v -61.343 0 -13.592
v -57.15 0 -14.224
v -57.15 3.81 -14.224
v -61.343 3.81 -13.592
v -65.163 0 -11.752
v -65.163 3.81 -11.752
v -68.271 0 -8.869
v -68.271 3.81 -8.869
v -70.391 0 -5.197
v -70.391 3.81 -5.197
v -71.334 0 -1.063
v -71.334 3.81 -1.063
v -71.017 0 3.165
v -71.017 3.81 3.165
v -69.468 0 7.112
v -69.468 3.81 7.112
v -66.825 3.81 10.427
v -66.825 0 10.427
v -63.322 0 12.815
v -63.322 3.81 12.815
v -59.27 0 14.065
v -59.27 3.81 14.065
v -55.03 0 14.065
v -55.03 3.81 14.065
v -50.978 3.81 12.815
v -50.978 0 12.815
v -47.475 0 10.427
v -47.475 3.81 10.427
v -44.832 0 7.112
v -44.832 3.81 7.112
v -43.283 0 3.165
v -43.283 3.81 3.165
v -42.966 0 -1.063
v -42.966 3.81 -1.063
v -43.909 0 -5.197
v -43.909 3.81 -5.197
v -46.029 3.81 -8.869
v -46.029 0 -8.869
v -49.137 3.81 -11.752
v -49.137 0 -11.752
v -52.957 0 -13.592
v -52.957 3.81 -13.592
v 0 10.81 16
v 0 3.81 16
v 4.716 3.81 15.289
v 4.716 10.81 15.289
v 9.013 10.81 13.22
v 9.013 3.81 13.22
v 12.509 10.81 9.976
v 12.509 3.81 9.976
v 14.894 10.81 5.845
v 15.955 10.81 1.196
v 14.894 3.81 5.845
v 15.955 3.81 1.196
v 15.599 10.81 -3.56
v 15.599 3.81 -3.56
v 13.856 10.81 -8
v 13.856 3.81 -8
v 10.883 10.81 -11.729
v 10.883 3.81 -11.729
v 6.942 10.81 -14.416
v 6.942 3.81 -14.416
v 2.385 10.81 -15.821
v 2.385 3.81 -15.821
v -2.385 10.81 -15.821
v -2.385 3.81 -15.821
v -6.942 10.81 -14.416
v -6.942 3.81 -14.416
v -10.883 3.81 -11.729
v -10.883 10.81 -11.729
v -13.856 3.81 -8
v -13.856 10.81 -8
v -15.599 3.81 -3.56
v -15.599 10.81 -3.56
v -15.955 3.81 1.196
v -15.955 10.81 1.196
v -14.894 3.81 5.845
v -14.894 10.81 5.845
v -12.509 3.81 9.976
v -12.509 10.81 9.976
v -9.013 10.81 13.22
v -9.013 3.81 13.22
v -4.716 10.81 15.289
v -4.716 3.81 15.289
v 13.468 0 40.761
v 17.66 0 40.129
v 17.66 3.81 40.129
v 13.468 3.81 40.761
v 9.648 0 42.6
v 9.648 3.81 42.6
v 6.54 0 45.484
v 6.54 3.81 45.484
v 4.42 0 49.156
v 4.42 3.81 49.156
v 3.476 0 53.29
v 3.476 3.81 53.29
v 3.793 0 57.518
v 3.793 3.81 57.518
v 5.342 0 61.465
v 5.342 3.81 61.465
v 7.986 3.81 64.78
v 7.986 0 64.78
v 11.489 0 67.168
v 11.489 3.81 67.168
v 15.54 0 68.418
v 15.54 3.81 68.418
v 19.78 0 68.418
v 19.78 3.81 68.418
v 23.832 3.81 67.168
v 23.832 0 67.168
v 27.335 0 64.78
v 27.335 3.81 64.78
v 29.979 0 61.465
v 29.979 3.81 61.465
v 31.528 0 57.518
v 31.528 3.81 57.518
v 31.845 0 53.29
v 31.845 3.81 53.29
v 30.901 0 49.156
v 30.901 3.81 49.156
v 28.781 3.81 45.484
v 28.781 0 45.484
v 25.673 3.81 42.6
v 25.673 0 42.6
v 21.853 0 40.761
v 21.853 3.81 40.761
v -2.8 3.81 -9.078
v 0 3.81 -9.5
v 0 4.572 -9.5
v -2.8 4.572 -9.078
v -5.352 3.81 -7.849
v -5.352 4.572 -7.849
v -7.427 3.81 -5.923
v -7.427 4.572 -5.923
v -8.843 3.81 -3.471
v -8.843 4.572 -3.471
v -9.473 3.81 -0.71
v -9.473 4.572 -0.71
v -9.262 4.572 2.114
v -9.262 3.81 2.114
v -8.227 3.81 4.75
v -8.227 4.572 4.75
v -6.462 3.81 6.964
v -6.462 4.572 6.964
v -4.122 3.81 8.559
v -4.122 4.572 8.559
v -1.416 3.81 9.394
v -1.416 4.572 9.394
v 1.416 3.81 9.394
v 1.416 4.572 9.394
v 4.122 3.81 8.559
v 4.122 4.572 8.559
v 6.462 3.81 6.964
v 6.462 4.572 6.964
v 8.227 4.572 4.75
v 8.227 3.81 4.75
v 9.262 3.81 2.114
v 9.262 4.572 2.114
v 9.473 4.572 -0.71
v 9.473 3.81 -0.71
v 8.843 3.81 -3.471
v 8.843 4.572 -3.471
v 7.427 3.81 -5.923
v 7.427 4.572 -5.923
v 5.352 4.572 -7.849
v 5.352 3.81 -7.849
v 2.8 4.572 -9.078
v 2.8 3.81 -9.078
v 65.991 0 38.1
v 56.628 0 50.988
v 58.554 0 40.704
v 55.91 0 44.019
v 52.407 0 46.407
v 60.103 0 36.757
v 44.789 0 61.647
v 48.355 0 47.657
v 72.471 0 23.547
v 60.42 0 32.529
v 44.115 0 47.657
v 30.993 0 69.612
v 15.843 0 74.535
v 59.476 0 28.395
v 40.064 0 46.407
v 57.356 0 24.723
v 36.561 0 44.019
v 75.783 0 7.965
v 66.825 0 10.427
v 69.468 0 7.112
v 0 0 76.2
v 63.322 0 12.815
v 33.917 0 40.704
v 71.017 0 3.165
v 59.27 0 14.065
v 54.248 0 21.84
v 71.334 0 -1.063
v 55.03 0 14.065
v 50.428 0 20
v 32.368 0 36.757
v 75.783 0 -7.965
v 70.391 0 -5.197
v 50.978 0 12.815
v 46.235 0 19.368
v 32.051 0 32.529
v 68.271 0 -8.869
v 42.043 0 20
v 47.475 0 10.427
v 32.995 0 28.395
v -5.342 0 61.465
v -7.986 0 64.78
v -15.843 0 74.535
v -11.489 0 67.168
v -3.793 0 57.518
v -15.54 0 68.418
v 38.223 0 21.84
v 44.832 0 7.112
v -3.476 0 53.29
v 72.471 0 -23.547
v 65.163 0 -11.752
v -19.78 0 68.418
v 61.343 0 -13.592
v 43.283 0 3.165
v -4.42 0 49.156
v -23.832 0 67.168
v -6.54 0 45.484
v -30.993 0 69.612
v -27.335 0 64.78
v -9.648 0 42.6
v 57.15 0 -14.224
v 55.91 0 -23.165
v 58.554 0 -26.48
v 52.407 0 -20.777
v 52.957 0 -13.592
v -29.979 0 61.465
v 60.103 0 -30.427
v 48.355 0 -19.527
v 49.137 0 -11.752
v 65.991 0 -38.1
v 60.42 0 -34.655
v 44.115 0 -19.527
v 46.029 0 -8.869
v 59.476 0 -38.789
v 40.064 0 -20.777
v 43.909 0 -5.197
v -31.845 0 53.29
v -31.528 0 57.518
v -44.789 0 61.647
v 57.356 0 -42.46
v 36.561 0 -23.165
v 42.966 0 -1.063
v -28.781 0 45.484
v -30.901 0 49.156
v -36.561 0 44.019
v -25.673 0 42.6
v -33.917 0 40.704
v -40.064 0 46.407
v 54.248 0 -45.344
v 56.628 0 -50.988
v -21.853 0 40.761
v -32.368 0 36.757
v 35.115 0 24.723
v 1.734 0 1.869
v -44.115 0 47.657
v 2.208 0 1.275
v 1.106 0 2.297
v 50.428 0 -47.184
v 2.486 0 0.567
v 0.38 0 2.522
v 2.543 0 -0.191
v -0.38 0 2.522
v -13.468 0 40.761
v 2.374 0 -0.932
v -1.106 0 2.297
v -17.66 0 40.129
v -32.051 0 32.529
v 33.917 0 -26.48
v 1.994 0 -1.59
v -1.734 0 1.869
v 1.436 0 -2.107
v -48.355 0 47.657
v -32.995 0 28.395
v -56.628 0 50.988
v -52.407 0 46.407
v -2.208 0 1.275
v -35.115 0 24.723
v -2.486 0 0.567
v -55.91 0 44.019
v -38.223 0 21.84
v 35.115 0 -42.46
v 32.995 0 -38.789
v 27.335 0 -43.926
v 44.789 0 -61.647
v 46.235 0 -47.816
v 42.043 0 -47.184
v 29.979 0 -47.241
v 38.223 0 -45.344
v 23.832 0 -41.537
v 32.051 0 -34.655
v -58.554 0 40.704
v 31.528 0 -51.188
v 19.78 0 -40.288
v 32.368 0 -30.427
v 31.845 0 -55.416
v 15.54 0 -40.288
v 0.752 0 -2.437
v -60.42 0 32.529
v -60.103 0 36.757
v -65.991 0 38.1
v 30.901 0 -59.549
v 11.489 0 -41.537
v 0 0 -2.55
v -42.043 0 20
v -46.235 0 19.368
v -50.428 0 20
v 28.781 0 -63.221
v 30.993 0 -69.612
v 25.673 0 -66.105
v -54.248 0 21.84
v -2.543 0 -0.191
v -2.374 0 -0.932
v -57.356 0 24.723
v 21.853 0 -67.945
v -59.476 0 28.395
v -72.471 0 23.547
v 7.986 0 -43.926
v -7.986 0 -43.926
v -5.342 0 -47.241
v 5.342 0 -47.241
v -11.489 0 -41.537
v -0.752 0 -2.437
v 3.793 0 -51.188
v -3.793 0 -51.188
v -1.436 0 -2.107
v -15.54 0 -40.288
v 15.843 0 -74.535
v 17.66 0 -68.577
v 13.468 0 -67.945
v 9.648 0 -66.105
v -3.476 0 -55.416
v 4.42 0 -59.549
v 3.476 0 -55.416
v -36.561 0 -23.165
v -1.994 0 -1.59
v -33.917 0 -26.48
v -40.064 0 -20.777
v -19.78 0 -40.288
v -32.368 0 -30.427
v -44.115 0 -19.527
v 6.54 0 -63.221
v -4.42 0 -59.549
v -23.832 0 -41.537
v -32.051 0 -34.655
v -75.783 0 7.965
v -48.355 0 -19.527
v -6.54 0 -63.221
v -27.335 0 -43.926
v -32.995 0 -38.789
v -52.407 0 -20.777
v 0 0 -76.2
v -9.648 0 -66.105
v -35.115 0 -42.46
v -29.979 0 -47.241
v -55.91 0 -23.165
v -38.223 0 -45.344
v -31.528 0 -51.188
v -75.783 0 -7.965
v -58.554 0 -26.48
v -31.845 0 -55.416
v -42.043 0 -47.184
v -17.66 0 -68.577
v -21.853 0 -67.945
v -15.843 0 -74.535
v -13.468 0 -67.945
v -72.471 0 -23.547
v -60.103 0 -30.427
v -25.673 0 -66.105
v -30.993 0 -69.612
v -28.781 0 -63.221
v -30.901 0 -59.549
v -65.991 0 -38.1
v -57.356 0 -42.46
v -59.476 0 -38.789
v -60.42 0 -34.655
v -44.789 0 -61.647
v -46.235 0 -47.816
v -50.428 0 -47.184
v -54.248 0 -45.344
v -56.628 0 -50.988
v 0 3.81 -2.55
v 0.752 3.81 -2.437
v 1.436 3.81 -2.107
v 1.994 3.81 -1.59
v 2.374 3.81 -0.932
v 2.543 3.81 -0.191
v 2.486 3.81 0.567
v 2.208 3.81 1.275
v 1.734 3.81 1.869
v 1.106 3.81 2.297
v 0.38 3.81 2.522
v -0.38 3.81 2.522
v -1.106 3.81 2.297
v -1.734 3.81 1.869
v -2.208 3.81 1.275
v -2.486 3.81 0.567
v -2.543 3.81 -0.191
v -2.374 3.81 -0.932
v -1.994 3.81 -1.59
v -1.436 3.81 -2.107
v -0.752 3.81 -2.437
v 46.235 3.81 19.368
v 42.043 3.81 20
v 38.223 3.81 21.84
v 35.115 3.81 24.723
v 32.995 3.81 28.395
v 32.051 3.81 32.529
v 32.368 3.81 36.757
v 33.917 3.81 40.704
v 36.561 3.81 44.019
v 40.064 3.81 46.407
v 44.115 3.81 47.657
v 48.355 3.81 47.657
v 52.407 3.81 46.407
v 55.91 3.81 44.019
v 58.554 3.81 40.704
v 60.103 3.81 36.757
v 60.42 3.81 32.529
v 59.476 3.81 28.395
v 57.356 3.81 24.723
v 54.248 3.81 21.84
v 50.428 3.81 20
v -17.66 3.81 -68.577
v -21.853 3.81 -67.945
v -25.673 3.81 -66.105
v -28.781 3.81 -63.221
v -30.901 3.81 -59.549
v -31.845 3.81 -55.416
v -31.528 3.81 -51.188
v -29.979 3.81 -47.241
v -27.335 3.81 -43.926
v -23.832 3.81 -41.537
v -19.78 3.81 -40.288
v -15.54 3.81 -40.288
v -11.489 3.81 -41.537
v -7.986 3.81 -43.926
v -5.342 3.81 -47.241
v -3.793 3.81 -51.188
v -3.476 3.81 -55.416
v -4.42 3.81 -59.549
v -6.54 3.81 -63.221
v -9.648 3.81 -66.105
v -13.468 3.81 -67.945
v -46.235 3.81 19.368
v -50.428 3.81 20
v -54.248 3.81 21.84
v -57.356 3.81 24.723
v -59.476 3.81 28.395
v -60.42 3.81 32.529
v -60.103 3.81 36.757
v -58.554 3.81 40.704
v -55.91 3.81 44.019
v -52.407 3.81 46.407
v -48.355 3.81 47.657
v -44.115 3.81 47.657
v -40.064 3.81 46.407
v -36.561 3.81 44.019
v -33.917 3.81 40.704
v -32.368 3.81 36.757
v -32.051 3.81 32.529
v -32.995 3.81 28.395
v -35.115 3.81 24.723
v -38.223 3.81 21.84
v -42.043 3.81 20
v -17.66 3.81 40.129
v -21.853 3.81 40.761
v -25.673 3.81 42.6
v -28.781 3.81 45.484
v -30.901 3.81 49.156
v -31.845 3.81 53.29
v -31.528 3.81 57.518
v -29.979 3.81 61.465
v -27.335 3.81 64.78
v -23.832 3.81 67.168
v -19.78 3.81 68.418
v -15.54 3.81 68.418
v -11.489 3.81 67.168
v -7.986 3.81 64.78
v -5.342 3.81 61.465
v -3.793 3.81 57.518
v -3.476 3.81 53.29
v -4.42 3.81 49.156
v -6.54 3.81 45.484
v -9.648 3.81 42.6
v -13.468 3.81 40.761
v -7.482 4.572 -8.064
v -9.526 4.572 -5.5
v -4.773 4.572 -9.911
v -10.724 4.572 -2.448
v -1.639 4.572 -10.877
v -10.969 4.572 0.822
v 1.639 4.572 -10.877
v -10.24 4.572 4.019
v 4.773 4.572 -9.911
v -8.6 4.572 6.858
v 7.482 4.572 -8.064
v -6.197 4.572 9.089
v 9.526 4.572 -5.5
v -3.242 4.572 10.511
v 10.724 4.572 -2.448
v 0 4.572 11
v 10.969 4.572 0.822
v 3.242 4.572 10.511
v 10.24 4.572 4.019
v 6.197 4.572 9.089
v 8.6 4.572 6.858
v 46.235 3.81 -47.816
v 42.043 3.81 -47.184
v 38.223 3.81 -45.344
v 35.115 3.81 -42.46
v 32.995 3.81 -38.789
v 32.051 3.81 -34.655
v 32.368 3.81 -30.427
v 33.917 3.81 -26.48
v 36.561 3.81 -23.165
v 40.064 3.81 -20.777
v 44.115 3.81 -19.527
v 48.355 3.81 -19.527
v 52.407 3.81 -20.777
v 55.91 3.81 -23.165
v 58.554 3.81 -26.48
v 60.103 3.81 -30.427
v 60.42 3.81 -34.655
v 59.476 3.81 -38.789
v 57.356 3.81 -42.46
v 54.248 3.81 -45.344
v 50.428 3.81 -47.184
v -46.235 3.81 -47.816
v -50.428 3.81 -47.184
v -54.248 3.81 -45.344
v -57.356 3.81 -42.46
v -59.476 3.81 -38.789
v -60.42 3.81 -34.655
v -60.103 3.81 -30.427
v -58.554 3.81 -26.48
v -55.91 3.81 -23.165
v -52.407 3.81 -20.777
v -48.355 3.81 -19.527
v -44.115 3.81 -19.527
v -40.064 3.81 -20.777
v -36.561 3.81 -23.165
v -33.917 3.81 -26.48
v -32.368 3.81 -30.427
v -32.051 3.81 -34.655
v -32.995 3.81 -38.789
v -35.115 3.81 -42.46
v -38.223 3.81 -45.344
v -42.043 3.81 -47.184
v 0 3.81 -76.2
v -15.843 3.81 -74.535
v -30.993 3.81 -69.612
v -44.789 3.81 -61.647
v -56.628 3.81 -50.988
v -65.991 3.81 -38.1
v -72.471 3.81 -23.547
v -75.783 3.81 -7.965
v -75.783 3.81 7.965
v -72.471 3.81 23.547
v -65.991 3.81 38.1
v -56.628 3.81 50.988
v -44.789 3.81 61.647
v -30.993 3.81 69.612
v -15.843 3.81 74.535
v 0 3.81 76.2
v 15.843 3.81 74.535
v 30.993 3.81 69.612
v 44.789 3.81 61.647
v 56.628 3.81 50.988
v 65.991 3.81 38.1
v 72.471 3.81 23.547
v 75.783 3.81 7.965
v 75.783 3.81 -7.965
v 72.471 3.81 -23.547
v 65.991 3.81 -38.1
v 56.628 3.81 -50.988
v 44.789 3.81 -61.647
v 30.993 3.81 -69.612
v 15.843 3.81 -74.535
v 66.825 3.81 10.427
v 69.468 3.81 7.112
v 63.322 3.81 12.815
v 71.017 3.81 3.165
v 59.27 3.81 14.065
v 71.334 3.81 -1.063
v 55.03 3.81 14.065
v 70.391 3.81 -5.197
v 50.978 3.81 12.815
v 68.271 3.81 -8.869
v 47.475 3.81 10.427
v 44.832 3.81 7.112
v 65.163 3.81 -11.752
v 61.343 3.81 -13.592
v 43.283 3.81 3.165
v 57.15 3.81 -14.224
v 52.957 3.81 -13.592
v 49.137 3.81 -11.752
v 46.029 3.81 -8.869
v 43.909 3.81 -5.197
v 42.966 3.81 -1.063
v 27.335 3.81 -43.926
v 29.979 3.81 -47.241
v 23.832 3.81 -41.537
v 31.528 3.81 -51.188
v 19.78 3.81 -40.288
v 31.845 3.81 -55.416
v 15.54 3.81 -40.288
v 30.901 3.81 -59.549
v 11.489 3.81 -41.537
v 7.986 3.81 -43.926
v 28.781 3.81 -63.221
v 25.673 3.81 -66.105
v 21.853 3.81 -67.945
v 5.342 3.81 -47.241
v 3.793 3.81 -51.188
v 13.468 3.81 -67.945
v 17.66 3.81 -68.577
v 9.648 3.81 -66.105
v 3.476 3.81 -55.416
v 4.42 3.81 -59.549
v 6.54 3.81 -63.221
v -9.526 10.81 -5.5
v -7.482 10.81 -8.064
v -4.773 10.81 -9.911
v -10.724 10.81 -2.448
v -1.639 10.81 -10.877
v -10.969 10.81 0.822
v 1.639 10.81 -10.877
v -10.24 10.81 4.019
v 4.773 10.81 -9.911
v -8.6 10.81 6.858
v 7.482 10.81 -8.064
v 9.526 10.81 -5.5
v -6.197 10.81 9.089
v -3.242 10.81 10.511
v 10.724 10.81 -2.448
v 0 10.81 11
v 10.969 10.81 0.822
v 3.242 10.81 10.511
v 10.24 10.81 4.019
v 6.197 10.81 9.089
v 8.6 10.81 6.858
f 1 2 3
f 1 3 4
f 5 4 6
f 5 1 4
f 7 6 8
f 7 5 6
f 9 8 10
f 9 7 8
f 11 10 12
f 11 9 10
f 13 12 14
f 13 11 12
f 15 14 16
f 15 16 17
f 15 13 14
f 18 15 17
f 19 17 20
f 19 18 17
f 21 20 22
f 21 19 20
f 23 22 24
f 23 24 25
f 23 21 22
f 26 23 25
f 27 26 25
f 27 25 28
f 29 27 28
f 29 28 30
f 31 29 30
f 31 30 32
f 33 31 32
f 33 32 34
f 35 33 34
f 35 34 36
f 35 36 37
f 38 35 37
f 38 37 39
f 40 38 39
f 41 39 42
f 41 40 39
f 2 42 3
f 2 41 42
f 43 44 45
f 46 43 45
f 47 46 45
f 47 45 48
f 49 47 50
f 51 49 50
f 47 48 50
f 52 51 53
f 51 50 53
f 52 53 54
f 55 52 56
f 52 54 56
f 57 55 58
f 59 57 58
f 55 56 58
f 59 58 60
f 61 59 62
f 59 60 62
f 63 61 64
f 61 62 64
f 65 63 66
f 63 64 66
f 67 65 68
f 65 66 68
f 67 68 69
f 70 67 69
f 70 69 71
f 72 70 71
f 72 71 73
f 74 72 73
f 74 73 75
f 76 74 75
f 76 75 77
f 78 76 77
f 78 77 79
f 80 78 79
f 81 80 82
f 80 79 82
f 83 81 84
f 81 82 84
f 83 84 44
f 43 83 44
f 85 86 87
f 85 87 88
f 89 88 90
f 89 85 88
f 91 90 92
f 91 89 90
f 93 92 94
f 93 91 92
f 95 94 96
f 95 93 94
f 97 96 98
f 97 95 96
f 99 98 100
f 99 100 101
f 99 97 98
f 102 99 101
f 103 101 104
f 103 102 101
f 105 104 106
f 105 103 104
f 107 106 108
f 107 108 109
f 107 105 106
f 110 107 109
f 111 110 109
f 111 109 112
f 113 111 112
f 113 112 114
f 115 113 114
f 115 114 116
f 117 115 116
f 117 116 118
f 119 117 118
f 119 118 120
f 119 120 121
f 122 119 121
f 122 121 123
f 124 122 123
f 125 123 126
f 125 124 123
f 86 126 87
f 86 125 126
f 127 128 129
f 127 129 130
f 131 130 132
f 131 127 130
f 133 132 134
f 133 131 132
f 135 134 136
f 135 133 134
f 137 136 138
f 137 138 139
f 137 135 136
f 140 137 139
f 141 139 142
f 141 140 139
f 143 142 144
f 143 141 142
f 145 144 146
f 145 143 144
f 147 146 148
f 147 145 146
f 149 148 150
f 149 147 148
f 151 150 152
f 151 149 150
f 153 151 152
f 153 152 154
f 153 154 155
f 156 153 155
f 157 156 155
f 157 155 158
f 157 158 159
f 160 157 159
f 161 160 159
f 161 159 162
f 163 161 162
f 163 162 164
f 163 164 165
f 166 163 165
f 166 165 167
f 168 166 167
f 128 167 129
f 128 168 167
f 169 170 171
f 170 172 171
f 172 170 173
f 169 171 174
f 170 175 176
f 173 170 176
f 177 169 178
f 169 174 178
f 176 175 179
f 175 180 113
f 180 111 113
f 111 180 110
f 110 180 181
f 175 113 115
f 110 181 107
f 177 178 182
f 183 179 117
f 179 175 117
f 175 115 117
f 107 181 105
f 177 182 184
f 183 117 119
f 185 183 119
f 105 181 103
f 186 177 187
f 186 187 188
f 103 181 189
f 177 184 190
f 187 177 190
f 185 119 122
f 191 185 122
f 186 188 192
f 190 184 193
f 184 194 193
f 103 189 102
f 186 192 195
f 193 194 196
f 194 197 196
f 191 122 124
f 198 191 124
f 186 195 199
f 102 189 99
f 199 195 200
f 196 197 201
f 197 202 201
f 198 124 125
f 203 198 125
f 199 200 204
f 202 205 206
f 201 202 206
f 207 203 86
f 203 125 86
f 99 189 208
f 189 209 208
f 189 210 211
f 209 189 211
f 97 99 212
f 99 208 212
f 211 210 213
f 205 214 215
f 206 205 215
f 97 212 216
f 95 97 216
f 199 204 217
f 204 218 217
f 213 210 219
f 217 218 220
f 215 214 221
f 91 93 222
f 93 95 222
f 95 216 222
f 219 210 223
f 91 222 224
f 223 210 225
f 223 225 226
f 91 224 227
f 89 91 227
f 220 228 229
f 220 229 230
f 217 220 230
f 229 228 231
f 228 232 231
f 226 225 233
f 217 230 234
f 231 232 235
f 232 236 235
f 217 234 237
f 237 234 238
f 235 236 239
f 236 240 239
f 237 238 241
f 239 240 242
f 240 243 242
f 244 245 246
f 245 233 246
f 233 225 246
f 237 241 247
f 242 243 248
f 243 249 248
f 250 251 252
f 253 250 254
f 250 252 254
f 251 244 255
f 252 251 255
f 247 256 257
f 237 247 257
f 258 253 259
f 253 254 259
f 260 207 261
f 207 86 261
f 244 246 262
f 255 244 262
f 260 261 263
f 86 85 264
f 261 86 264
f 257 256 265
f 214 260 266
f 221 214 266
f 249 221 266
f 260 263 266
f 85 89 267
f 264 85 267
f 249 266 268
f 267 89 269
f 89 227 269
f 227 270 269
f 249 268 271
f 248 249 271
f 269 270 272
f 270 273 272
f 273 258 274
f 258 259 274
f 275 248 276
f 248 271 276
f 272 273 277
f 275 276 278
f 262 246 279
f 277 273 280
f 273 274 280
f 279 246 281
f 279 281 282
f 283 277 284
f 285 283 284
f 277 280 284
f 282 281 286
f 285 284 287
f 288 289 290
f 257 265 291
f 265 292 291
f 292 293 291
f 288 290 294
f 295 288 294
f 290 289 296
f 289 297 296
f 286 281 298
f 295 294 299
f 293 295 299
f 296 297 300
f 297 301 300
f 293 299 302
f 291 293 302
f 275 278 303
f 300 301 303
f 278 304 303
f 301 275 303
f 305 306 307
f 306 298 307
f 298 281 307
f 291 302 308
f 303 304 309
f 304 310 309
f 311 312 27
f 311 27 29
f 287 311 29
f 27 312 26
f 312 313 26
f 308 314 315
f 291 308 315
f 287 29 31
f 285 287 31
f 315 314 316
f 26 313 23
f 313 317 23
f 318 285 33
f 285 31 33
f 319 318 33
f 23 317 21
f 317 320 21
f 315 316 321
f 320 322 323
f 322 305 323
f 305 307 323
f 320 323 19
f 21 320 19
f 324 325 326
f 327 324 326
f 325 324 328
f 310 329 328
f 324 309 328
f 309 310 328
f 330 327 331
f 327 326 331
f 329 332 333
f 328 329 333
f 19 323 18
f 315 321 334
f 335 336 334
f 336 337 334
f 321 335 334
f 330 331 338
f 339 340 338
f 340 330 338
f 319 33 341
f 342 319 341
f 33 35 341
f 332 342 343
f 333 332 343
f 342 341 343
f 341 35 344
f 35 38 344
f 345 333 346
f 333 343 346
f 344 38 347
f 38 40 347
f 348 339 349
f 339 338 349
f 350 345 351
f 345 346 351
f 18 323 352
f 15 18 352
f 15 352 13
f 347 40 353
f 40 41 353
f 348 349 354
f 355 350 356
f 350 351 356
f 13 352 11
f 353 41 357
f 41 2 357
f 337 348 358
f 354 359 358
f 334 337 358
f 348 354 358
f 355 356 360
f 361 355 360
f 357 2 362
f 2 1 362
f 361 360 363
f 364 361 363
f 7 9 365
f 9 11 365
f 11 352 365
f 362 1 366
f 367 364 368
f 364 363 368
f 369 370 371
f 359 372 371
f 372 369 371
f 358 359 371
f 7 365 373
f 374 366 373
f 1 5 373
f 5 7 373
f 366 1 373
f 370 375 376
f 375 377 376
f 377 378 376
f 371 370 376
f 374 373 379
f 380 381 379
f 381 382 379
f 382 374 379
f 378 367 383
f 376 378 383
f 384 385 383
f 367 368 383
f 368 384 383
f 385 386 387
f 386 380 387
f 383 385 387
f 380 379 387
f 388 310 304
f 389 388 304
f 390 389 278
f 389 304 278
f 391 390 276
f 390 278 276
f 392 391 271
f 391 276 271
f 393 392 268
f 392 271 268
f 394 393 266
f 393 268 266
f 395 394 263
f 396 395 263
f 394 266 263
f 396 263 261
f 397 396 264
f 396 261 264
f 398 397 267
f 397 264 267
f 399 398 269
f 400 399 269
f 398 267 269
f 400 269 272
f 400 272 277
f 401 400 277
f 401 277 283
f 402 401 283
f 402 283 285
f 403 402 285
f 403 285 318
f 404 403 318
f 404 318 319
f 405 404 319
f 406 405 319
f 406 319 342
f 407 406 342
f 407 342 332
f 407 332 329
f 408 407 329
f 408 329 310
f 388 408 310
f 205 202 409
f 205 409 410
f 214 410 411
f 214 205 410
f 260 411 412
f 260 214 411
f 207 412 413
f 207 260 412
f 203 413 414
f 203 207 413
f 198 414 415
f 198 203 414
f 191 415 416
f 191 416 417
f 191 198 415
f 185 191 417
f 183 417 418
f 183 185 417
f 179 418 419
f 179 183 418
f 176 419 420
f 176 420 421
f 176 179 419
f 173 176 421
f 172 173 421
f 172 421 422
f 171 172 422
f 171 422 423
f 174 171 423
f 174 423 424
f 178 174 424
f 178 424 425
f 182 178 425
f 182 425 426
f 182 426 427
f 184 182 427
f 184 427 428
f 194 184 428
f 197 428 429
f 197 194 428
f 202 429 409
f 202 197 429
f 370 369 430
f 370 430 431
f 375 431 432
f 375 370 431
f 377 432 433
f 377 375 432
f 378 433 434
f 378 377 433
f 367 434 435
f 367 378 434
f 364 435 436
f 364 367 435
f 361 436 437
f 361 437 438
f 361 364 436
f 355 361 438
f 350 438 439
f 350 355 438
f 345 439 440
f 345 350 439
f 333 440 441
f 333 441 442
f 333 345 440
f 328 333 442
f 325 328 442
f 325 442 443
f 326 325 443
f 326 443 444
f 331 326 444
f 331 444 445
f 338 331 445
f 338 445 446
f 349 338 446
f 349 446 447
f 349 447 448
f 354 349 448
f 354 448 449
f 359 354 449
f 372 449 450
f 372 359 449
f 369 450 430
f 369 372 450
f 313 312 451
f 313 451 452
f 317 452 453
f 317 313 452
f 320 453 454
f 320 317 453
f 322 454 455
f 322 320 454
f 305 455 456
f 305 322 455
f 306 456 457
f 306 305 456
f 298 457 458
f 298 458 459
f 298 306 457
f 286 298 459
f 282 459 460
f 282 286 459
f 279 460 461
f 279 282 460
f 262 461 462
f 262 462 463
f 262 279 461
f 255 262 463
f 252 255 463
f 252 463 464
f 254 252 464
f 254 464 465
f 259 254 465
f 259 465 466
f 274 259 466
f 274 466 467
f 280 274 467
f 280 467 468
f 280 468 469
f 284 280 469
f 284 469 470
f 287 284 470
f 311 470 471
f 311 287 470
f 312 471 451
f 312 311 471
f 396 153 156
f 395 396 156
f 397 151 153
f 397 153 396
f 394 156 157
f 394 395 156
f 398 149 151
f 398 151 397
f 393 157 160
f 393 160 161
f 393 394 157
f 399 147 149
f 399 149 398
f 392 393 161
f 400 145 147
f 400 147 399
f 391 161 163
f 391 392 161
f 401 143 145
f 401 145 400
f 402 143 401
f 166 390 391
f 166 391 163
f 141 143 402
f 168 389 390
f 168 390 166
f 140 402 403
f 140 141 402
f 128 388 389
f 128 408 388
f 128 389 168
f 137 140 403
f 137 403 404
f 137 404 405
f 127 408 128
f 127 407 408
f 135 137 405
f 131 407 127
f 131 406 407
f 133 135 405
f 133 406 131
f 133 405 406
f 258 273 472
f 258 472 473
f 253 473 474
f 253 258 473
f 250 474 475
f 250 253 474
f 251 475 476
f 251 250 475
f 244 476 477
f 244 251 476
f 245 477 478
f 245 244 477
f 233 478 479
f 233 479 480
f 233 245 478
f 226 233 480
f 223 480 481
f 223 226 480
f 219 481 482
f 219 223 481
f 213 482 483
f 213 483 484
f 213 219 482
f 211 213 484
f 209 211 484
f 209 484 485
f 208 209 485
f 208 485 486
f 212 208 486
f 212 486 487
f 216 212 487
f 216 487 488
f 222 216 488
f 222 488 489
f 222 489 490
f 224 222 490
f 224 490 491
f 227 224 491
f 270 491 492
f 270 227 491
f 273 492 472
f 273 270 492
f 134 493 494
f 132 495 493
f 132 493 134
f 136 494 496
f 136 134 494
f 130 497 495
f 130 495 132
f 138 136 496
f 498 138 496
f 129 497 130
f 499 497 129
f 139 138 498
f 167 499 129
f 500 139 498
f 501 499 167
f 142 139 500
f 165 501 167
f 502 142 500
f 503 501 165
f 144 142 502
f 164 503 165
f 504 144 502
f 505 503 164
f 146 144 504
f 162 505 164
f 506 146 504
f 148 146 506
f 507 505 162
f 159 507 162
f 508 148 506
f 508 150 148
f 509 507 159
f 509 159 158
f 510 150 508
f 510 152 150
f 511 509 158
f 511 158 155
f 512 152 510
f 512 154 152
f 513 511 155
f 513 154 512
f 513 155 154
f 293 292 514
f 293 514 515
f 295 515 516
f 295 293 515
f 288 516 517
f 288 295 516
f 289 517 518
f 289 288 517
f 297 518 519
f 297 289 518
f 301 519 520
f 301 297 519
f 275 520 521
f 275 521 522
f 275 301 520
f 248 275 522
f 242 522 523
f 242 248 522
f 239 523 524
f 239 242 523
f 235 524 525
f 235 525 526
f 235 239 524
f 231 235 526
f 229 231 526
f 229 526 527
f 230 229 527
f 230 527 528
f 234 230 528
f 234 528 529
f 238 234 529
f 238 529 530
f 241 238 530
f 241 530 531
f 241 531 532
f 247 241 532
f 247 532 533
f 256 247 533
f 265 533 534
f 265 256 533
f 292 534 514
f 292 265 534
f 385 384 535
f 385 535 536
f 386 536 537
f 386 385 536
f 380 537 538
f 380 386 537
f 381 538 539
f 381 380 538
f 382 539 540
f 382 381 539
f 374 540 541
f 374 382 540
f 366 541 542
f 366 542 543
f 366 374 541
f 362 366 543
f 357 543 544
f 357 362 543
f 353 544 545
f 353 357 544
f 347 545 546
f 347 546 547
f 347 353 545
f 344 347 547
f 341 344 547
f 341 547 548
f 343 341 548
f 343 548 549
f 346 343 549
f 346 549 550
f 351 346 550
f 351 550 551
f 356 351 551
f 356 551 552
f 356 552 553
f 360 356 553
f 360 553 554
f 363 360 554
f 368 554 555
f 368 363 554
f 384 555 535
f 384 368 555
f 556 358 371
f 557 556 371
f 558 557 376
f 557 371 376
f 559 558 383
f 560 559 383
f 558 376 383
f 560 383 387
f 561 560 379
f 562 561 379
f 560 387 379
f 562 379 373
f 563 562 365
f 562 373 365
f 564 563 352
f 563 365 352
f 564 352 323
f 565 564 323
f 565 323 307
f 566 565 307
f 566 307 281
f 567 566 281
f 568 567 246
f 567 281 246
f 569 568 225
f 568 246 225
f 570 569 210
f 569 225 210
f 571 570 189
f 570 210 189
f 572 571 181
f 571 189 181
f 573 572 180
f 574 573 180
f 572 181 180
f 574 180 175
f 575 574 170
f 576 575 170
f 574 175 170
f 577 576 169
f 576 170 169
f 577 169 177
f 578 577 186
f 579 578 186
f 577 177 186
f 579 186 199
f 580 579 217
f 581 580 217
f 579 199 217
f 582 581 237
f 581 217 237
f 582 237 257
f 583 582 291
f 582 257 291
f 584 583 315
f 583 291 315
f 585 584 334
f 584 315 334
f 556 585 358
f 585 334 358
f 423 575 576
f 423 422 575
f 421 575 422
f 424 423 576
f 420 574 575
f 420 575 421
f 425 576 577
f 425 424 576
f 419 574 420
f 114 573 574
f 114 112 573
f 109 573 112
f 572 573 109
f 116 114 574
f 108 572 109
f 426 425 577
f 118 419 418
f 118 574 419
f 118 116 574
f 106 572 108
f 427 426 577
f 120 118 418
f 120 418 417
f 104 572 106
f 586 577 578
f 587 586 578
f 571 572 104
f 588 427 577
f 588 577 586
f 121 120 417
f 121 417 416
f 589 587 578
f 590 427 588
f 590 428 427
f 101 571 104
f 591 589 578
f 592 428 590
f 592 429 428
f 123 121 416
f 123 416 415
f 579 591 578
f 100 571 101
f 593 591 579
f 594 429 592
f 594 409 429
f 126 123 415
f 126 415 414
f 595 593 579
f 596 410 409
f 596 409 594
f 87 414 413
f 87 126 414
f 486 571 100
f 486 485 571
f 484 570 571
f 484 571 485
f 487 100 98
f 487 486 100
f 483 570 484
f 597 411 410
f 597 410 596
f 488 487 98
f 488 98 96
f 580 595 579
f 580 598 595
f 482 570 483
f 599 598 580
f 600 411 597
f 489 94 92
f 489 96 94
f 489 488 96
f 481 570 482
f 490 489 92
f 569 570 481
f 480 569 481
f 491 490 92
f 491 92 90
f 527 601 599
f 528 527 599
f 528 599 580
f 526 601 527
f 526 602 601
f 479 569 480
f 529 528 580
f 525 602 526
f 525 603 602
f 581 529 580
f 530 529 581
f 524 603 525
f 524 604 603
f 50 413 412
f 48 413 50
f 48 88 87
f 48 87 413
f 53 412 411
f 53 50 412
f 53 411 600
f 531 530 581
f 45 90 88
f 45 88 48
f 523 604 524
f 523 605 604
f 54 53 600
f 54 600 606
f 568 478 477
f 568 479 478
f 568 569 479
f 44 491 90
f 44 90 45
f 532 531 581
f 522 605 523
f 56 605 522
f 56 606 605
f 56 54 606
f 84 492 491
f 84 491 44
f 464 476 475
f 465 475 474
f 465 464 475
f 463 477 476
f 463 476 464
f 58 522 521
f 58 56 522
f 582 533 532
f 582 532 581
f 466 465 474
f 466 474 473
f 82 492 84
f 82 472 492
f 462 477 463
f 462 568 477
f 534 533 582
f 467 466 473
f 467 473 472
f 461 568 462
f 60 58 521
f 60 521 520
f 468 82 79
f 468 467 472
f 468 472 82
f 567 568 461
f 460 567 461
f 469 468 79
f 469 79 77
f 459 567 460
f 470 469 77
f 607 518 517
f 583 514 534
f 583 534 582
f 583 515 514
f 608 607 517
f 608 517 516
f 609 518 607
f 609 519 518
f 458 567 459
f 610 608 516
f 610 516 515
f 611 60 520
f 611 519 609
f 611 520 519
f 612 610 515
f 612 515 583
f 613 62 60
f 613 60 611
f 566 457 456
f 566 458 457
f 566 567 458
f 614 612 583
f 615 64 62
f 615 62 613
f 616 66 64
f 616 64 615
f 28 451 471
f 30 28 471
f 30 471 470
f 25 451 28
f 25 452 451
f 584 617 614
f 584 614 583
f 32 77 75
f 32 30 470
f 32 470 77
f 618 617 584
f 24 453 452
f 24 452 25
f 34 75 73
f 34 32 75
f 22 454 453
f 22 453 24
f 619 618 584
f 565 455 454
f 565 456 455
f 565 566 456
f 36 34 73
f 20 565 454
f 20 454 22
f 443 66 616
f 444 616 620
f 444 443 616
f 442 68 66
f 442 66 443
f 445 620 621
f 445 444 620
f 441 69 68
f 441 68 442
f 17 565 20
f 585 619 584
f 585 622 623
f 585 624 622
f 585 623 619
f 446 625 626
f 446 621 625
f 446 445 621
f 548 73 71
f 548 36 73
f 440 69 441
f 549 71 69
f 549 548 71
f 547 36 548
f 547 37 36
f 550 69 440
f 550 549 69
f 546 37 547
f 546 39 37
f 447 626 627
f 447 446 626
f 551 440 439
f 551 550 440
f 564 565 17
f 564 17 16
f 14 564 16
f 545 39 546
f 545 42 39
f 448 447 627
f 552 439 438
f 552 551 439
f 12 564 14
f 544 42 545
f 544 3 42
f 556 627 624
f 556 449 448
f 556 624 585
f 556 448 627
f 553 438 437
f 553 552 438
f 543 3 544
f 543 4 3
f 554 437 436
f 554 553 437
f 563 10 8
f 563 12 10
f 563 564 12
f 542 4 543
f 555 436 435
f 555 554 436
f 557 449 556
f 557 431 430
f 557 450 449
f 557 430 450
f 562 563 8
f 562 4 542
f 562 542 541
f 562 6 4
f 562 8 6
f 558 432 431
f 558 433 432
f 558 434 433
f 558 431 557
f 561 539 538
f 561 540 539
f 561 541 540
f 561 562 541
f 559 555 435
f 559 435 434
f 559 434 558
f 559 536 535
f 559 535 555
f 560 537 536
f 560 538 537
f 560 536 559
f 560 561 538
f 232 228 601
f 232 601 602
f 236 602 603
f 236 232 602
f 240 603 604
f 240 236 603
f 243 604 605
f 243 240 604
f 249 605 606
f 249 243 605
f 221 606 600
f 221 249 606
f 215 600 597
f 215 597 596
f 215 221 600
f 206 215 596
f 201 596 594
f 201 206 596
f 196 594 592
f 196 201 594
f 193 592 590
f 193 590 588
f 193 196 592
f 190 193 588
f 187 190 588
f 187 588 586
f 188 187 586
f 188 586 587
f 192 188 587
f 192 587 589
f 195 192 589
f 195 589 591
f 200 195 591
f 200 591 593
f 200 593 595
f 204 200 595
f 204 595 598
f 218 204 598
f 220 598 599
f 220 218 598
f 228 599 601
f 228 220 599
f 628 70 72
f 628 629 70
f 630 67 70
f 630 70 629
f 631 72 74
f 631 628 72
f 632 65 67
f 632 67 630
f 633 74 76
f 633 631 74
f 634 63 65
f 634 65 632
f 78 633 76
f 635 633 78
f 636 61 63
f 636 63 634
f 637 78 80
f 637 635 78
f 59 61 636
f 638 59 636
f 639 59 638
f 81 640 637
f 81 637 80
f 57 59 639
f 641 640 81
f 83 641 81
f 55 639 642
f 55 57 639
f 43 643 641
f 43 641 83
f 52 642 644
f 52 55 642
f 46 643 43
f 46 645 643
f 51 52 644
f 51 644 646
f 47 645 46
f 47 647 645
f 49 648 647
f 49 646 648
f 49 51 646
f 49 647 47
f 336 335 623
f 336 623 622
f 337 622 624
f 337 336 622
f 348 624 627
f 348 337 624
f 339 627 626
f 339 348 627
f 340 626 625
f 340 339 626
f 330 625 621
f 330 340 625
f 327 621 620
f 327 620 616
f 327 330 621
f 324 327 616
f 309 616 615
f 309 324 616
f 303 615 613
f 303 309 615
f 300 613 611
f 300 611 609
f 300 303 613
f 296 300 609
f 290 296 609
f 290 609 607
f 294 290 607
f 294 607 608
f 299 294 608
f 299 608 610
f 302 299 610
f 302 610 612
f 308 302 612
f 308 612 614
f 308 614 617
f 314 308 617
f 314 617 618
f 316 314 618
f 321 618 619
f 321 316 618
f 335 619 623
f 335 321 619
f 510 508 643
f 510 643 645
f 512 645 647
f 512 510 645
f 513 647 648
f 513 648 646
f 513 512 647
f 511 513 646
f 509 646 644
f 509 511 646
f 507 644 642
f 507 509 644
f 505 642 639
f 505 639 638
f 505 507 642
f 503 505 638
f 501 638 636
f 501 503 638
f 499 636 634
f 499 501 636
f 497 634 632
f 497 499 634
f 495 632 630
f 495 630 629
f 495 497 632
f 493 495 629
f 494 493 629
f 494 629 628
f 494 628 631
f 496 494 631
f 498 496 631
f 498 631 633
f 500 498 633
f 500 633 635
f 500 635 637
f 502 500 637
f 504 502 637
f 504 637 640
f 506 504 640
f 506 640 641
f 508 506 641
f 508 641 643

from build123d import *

# Parameters (mm, degrees)
SKETCH1_R           = 76.2
SKETCH1_R_2         = 14.224
BOSS_EXTRUDE1_DEPTH = 3.81
SKETCH4_R           = 16
SKETCH4_R_2         = 11
BOSS_EXTRUDE5_DEPTH = 7
SKETCH5_R           = 11
SKETCH5_R_2         = 9.5
BOSS_EXTRUDE6_DEPTH = 0.762
SKETCH6_R           = 2.55
CUT_EXTRUDE1_DEPTH  = 109.303906208


with BuildPart() as part:
    # Sketch1 → Boss-Extrude1 (new body)
    with BuildSketch(Plane(origin=(0, 0, 0), x_dir=(1, 0, 0), z_dir=(0, 1, 0))):
        with Locations(Location((0, 0, 0), (0, 0, 90))):
            Circle(SKETCH1_R)
        with Locations(Location((-57.15, 0, 0), (0, 0, 90))):
            Circle(SKETCH1_R_2, mode=Mode.SUBTRACT)
        with Locations(Location((-46.235321229, 33.591927169, 0), (0, 0, 90))):
            Circle(SKETCH1_R_2, mode=Mode.SUBTRACT)
        with Locations(Location((-17.660321229, 54.352879906, 0), (0, 0, 90))):
            Circle(SKETCH1_R_2, mode=Mode.SUBTRACT)
        with Locations(Location((17.660321229, 54.352879906, 0), (0, 0, 90))):
            Circle(SKETCH1_R_2, mode=Mode.SUBTRACT)
        with Locations(Location((46.235321229, 33.591927169, 0), (0, 0, 90))):
            Circle(SKETCH1_R_2, mode=Mode.SUBTRACT)
        with Locations(Location((57.15, 0, 0), (0, 0, 90))):
            Circle(SKETCH1_R_2, mode=Mode.SUBTRACT)
        with Locations(Location((46.235321229, -33.591927169, 0), (0, 0, 90))):
            Circle(SKETCH1_R_2, mode=Mode.SUBTRACT)
        with Locations(Location((17.660321229, -54.352879906, 0), (0, 0, 90))):
            Circle(SKETCH1_R_2, mode=Mode.SUBTRACT)
        with Locations(Location((-17.660321229, -54.352879906, 0), (0, 0, 90))):
            Circle(SKETCH1_R_2, mode=Mode.SUBTRACT)
        with Locations(Location((-46.235321229, -33.591927169, 0), (0, 0, 90))):
            Circle(SKETCH1_R_2, mode=Mode.SUBTRACT)
    extrude(amount=BOSS_EXTRUDE1_DEPTH)

    # Sketch4 → Boss-Extrude5 (add)
    with BuildSketch(Plane(origin=(0, 3.81, 0), x_dir=(1, 0, 0), z_dir=(0, 1, 0))):
        with Locations(Location((0, 0, 0), (0, 0, 270))):
            Circle(SKETCH4_R)
        with Locations(Location((0, 0, 0), (0, 0, 270))):
            Circle(SKETCH4_R_2, mode=Mode.SUBTRACT)
    extrude(amount=BOSS_EXTRUDE5_DEPTH)

    # Sketch5 → Boss-Extrude6 (add)
    with BuildSketch(Plane(origin=(0, 3.81, 0), x_dir=(1, 0, 0), z_dir=(0, 1, 0))):
        with Locations(Location((0, 0, 0), (0, 0, 270))):
            Circle(SKETCH5_R)
        with Locations(Location((0, 0, 0), (0, 0, 90))):
            Circle(SKETCH5_R_2, mode=Mode.SUBTRACT)
    extrude(amount=BOSS_EXTRUDE6_DEPTH)

    # Sketch6 → Cut-Extrude1 (cut, through all)
    with BuildSketch(Plane.XZ):
        with Locations(Location((0, 0, 0), (0, 0, 270))):
            Circle(SKETCH6_R)
    extrude(amount=-CUT_EXTRUDE1_DEPTH, mode=Mode.SUBTRACT)


solid = part.part
